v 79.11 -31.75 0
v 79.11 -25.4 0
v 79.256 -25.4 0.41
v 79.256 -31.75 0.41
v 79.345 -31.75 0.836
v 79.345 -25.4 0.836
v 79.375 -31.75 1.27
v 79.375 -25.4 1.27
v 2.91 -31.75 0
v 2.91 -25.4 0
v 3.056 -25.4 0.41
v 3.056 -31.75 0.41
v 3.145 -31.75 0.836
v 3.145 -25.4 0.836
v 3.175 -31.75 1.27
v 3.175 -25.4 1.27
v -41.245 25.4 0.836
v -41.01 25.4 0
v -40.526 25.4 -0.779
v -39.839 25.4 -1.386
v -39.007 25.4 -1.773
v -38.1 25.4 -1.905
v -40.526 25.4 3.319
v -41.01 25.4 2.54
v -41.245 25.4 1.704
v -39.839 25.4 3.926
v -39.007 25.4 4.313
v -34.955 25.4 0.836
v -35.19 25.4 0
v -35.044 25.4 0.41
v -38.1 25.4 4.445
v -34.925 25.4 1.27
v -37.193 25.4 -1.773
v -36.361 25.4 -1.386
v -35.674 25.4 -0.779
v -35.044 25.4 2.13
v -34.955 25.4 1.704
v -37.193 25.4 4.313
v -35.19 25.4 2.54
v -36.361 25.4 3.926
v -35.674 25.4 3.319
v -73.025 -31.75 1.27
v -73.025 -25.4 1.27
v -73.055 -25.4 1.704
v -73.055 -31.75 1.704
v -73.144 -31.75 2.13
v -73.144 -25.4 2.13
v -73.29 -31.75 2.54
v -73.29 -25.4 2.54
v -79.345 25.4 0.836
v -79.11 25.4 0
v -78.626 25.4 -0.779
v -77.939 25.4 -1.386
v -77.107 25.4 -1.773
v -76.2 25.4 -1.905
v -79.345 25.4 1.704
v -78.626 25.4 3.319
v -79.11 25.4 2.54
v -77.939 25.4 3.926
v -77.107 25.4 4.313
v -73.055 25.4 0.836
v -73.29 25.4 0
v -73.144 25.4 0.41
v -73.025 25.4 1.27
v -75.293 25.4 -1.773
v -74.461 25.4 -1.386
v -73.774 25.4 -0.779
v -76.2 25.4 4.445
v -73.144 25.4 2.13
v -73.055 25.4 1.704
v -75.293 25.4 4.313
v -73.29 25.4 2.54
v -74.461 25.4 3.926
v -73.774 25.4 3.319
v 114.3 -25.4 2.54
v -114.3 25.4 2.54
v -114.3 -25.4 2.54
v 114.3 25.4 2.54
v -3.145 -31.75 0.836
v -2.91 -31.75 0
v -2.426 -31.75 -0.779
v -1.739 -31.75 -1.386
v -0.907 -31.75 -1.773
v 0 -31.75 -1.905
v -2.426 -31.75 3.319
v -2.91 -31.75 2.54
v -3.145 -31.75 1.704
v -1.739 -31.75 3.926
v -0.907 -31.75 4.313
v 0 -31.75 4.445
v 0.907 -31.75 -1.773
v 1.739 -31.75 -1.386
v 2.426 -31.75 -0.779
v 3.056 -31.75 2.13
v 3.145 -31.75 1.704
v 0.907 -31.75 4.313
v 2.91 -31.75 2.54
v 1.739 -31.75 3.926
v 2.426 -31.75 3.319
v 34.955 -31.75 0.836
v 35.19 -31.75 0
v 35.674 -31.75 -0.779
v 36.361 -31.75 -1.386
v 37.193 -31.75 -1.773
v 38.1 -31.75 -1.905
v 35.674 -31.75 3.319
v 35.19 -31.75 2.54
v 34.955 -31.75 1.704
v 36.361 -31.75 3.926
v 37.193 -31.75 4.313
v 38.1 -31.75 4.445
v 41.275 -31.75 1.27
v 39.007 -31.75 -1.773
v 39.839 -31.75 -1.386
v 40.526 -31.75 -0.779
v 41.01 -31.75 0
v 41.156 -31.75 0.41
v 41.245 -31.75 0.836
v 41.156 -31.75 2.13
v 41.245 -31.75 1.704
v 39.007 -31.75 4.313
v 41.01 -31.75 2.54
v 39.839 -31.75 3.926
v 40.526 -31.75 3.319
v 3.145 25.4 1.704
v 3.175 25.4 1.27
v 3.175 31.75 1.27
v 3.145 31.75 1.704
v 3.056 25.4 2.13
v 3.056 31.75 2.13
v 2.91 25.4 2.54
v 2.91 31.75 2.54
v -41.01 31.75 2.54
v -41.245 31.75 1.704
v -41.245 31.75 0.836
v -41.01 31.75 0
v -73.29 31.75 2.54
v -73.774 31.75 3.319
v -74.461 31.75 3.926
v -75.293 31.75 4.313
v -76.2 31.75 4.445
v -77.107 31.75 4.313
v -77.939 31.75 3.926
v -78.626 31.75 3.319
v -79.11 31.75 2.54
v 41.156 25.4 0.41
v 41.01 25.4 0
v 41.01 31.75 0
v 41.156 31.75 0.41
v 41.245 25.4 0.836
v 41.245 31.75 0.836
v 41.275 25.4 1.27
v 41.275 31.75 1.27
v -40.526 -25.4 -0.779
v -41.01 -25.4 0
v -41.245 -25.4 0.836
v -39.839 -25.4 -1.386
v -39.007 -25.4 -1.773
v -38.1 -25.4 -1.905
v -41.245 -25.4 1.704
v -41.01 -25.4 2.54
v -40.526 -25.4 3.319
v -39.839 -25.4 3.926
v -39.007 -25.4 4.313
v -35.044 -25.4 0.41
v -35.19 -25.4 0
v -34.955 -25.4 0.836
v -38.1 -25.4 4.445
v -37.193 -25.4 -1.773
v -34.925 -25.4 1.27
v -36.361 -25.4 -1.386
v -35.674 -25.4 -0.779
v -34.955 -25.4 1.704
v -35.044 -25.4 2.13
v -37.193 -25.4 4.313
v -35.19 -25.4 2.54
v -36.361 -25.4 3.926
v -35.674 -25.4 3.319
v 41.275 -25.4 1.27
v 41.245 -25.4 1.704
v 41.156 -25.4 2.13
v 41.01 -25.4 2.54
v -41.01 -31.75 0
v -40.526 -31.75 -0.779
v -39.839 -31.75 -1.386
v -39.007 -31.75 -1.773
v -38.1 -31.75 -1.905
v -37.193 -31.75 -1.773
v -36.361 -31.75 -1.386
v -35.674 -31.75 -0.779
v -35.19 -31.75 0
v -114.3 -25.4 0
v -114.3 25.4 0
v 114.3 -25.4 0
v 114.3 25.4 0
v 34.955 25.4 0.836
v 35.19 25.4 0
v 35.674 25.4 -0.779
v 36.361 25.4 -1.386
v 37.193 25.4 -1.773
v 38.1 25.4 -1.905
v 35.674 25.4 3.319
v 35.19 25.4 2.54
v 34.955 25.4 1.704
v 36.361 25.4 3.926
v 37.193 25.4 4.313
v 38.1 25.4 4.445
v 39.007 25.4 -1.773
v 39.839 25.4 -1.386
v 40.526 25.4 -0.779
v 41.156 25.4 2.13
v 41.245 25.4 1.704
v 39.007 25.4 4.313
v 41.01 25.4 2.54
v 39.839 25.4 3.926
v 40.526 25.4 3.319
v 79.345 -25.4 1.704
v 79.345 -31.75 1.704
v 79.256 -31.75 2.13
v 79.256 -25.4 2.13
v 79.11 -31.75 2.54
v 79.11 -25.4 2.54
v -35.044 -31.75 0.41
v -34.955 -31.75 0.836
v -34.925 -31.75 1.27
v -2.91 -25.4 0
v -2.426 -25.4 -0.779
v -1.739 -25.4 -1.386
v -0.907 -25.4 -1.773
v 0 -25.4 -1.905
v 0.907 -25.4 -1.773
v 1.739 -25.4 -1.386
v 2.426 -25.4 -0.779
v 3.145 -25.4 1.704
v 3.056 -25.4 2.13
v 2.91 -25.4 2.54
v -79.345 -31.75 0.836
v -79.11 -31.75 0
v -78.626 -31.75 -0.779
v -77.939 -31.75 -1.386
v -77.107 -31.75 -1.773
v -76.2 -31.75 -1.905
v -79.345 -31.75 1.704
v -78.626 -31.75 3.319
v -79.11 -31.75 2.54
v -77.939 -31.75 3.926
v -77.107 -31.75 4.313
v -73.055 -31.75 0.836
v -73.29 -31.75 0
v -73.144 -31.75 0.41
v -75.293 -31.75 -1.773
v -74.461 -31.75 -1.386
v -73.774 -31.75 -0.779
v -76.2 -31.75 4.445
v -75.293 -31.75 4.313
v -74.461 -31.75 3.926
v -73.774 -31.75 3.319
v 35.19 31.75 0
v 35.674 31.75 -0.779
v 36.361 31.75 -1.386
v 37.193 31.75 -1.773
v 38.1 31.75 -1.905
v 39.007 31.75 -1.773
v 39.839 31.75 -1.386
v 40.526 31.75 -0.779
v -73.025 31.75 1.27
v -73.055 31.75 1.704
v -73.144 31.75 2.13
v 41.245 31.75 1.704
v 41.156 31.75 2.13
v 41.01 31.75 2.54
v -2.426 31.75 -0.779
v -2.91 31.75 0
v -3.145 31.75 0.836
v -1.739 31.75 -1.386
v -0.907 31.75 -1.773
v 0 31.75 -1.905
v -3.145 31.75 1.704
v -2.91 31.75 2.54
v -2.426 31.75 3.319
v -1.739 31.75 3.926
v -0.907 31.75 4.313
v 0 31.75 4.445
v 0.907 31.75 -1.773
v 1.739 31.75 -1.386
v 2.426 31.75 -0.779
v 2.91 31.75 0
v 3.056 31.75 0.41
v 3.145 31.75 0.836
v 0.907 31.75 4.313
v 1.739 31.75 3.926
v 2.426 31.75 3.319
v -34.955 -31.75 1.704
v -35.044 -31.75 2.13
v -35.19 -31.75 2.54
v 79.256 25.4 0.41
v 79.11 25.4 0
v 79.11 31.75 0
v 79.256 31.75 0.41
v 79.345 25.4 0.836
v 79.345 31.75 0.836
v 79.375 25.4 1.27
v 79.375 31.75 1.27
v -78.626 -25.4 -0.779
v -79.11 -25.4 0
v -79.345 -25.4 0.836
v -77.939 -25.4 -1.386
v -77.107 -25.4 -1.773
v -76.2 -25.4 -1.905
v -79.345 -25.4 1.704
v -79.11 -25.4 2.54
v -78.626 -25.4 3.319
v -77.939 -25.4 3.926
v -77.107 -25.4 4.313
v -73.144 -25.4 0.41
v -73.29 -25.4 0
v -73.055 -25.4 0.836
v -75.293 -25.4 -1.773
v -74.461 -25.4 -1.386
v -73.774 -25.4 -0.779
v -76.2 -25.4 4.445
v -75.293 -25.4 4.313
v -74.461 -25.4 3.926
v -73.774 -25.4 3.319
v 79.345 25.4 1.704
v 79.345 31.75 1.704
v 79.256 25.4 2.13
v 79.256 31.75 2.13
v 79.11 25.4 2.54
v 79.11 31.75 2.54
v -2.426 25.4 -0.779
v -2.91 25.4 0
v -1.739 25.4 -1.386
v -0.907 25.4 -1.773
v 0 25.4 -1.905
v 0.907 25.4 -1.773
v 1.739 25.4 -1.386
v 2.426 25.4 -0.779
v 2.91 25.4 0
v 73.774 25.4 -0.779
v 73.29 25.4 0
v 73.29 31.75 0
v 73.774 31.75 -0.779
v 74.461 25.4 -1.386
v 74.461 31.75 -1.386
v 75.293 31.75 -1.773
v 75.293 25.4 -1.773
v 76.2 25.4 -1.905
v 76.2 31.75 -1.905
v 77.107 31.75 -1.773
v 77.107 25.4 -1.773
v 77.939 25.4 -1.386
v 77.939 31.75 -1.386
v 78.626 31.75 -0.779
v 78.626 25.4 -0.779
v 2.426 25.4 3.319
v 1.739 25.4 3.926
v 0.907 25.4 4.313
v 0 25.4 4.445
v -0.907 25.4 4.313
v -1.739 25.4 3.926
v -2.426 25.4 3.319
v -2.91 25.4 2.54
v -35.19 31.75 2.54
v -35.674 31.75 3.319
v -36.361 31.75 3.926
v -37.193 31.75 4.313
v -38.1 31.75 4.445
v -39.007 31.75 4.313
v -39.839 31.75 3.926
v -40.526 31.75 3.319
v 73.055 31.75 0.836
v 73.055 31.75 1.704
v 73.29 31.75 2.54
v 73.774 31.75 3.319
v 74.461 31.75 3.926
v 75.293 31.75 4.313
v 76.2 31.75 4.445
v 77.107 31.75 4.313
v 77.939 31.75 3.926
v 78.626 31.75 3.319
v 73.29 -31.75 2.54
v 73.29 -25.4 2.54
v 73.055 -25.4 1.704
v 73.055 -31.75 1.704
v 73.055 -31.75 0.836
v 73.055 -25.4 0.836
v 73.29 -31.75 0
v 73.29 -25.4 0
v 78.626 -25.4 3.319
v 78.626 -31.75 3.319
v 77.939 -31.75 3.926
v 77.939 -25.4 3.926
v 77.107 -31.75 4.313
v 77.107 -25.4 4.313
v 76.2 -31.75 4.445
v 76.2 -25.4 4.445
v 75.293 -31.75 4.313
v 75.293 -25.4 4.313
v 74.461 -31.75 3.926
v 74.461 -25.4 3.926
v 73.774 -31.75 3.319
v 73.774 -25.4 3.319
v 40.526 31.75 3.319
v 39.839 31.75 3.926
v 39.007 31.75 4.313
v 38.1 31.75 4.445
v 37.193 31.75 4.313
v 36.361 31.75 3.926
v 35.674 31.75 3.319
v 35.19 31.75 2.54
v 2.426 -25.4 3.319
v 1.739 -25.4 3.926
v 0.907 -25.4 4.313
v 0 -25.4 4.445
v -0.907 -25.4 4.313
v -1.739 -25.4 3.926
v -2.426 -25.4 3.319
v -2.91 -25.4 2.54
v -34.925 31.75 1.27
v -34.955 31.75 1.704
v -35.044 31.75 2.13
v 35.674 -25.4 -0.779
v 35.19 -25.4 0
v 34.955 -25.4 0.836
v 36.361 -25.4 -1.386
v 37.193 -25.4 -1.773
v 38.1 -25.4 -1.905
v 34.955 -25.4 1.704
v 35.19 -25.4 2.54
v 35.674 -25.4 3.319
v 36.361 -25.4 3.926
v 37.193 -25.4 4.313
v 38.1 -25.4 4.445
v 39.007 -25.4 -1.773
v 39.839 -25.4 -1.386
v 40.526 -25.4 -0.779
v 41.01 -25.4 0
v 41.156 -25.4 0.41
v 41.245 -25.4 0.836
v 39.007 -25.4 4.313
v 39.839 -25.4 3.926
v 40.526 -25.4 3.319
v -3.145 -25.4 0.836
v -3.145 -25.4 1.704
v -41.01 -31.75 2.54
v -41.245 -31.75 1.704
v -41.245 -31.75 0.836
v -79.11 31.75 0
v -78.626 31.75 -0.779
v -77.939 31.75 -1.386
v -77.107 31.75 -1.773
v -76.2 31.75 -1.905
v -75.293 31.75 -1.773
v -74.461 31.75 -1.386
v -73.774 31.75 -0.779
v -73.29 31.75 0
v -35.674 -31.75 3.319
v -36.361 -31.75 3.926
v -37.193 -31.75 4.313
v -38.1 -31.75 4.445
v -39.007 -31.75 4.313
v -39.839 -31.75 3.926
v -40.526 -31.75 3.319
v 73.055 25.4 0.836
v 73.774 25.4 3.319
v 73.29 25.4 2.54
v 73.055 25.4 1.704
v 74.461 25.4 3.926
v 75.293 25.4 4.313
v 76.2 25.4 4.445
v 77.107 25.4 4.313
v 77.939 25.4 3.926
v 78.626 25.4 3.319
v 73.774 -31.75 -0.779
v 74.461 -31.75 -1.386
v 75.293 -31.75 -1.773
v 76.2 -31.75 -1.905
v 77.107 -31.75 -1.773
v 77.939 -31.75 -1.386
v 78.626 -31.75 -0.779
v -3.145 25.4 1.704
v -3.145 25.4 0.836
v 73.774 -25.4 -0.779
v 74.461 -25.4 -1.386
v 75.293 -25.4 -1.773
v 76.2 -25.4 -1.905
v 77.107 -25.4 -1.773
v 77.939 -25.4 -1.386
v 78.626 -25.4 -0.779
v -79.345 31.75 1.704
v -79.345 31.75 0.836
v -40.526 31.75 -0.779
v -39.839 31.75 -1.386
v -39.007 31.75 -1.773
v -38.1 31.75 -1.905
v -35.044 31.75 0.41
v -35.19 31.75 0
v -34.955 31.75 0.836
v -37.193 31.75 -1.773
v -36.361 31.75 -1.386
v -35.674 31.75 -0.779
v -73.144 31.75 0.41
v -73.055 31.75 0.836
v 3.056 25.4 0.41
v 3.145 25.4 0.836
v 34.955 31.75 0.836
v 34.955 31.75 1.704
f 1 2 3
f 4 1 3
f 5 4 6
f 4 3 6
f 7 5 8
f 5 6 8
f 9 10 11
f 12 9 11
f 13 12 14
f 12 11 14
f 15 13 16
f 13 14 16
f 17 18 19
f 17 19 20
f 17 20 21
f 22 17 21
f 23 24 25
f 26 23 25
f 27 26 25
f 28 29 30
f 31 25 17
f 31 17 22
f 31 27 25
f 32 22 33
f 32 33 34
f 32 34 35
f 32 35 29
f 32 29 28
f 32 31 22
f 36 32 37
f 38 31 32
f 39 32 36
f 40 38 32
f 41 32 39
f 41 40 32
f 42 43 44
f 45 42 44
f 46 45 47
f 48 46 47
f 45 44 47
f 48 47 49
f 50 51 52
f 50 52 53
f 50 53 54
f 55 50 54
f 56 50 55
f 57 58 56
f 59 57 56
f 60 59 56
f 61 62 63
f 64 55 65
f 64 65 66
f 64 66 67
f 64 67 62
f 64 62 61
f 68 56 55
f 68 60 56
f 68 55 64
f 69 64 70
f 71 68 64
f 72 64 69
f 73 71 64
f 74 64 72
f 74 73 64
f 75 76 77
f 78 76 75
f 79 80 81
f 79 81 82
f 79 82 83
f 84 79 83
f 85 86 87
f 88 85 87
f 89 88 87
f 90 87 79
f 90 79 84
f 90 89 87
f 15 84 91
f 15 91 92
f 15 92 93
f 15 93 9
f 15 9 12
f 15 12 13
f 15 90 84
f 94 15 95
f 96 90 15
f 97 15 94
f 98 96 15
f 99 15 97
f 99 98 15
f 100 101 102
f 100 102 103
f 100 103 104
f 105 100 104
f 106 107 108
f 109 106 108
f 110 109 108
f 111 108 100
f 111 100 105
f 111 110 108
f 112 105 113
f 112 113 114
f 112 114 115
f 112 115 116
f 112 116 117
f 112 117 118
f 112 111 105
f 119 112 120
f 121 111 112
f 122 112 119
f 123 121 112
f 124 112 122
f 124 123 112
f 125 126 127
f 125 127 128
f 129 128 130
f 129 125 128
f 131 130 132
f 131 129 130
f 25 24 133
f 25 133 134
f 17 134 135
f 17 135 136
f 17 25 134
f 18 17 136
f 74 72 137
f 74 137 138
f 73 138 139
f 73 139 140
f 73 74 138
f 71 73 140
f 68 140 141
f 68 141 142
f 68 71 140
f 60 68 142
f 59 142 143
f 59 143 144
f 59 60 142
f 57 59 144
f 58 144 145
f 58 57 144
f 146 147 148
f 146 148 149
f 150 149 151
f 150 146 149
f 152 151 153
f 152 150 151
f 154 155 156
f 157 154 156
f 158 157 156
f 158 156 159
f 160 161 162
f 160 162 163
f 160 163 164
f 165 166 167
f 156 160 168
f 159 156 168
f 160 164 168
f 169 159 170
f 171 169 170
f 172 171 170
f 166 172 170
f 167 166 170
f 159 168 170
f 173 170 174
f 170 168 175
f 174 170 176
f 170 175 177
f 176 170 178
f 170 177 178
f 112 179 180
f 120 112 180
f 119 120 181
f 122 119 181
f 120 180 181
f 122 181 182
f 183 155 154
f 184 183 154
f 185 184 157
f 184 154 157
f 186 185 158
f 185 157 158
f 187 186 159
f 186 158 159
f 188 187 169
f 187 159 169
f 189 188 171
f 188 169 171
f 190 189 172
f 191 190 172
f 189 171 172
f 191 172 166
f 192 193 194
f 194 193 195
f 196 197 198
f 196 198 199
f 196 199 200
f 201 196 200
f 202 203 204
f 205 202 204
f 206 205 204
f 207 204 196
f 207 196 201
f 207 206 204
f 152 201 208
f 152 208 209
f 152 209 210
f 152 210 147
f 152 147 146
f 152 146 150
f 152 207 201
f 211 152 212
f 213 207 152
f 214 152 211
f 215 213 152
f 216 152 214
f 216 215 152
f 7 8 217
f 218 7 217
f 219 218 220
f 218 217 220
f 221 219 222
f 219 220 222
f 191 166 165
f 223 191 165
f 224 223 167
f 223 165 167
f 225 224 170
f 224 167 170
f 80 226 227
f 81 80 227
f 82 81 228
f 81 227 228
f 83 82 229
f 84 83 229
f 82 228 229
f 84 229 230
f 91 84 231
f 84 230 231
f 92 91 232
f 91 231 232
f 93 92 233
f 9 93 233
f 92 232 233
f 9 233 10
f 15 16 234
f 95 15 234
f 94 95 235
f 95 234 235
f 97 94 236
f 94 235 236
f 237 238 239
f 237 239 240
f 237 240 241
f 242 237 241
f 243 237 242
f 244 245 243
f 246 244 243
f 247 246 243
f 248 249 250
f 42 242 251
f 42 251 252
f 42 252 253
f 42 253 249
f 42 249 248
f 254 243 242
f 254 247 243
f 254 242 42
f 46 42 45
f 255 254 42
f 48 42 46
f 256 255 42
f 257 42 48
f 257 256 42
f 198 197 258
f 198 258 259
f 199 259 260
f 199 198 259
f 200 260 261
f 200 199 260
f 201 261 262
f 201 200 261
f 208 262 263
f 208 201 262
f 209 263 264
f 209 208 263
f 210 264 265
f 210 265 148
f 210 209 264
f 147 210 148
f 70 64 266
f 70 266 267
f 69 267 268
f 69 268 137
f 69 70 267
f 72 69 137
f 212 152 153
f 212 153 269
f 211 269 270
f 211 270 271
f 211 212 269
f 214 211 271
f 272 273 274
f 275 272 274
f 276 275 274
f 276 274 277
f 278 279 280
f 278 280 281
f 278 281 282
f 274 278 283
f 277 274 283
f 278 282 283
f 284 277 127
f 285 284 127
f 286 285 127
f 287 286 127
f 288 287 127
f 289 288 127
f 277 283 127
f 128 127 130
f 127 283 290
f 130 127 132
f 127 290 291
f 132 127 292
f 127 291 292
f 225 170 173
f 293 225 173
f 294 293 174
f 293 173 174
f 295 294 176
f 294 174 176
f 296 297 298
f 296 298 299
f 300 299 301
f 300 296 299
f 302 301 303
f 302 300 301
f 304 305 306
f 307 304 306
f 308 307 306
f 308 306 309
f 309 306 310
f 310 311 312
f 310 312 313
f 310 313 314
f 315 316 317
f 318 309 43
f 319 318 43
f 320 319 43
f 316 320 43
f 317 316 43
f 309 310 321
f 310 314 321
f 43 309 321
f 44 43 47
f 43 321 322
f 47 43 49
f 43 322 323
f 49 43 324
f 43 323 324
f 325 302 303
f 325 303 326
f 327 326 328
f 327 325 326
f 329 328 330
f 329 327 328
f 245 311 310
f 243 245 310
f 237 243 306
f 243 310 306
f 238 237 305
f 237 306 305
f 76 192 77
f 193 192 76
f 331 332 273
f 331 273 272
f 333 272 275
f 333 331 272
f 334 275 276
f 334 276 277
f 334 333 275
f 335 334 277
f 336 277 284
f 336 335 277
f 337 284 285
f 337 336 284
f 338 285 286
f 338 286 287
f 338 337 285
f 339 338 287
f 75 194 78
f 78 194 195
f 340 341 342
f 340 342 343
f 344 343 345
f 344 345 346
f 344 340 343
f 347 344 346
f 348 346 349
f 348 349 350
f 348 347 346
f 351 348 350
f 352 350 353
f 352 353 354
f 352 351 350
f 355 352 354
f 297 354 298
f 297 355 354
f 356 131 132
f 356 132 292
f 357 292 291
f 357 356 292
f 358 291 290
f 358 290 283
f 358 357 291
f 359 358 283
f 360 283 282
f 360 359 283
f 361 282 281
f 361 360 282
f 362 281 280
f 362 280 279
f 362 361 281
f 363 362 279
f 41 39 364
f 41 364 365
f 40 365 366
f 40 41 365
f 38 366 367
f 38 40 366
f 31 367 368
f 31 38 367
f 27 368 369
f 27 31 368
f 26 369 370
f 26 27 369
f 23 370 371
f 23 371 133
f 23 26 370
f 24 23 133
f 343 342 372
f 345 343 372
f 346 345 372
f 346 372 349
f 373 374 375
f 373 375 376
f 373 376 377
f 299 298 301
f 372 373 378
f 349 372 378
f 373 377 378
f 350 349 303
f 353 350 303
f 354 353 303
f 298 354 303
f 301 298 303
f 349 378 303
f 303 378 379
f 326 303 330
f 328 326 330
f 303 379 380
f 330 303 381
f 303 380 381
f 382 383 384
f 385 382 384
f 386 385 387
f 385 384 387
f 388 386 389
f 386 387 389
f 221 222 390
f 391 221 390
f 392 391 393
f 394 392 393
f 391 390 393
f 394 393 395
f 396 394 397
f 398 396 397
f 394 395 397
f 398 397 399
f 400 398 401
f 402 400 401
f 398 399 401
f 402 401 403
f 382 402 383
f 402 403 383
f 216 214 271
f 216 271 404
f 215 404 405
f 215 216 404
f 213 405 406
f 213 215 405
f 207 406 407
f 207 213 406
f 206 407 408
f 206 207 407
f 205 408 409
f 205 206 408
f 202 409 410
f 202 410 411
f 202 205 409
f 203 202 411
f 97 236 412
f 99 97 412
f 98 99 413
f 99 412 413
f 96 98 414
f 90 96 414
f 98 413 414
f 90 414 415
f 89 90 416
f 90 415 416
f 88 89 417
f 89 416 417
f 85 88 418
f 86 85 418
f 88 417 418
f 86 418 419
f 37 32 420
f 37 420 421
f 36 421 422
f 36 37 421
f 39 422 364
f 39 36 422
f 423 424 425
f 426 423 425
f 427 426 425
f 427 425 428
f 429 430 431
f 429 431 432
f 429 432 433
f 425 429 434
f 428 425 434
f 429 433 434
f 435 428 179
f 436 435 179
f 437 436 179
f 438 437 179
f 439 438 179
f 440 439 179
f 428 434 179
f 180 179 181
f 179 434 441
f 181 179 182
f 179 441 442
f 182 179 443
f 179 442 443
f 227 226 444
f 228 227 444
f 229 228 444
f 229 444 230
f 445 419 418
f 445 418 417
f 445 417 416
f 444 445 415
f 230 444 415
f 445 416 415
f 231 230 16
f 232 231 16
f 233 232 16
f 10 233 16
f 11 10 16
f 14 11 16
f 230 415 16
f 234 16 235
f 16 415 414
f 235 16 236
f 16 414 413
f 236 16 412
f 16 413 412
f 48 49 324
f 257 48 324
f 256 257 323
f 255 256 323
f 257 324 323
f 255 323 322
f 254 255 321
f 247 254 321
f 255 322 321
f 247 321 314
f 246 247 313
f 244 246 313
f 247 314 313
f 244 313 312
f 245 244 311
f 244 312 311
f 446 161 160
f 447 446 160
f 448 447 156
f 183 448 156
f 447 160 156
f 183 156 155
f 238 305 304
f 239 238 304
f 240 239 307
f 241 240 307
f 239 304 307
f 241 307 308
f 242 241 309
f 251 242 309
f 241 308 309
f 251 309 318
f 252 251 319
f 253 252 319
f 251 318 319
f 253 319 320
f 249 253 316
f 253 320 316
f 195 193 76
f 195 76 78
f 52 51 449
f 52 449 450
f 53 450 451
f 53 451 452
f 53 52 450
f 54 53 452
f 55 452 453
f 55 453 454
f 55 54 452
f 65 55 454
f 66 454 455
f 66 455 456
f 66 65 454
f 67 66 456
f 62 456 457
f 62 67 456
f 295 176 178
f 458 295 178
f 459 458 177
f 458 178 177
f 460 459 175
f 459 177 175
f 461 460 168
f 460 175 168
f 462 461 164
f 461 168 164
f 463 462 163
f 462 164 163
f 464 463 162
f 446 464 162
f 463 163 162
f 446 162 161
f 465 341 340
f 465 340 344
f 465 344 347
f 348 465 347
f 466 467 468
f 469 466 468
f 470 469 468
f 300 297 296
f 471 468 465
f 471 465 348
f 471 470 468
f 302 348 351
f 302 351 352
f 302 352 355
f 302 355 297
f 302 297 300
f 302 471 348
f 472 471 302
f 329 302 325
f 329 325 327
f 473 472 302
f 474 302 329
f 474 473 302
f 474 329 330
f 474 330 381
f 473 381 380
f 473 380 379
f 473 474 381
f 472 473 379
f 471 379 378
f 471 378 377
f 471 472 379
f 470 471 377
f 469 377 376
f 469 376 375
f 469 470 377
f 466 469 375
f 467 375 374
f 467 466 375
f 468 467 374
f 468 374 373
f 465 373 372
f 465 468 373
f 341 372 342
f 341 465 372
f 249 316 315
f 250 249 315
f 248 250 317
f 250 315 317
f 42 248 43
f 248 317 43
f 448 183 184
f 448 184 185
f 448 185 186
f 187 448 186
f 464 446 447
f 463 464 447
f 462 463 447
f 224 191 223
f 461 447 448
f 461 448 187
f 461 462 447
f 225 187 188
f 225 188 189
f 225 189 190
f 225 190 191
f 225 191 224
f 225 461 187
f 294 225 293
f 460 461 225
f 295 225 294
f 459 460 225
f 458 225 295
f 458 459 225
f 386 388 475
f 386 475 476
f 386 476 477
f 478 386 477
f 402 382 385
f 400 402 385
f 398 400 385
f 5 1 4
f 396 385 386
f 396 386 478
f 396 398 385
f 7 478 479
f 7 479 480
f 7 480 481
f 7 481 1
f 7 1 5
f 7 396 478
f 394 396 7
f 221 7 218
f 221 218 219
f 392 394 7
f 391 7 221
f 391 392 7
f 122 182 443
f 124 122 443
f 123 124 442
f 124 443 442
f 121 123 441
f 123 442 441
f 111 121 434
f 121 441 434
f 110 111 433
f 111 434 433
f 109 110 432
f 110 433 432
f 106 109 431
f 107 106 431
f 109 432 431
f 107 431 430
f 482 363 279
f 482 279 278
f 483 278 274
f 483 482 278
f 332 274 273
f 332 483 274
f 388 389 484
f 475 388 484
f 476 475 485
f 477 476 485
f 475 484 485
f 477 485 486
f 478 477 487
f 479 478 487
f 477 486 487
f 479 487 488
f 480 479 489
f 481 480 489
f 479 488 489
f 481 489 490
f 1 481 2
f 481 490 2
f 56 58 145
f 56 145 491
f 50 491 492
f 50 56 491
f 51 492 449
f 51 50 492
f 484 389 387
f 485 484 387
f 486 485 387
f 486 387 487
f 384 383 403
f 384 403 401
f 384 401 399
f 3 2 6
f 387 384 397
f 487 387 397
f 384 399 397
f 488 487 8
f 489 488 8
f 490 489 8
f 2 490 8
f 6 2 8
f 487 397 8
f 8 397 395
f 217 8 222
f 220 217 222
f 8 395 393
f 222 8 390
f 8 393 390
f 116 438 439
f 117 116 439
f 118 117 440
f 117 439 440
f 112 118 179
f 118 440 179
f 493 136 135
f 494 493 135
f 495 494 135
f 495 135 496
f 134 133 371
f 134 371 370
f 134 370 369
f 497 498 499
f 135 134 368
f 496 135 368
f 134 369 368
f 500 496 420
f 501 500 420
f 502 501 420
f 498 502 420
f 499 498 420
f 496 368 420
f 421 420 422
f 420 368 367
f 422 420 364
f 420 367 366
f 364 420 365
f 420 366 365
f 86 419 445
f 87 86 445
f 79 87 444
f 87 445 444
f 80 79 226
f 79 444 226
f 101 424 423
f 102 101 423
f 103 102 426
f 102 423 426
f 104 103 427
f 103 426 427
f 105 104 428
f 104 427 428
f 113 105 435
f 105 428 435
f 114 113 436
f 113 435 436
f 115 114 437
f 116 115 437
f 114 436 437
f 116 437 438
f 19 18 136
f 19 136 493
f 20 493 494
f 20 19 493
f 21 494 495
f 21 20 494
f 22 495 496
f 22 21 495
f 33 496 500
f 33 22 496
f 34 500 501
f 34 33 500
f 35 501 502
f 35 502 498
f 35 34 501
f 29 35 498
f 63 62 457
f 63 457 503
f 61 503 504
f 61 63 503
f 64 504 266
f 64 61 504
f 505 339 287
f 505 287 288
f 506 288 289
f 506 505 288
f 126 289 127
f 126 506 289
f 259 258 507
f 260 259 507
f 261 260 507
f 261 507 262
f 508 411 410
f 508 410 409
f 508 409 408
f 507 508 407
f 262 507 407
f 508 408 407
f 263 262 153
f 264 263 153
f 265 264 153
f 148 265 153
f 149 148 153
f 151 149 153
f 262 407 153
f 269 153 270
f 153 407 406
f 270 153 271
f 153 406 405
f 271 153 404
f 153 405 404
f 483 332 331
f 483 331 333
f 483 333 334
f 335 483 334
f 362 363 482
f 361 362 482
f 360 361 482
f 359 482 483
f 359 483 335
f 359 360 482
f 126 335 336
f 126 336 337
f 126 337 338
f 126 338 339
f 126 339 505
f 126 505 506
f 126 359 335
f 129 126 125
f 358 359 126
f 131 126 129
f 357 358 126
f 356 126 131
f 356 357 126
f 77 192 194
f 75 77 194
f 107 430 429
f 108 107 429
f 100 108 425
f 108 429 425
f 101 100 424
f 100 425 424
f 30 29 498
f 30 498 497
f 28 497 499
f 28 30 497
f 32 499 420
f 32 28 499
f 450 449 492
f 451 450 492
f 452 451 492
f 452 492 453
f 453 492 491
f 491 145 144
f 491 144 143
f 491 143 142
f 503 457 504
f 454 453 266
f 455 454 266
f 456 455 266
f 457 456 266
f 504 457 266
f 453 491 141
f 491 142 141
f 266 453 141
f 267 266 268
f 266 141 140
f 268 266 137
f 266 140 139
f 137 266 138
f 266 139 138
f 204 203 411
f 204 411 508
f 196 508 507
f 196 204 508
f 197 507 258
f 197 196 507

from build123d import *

# Parameters (mm, degrees)
F0_W     = 228.6
F0_H     = 50.8
F1_DEPTH = 2.54
F3_DEPTH = 6.35


with BuildPart() as f1:
    # F0 (on Top) → F1 (new body)
    with BuildSketch(Plane.XY):
        Rectangle(F0_W, F0_H)
    extrude(amount=F1_DEPTH)


with BuildPart() as f3:
    # F2 (on face) → F3 (new body)
    with BuildSketch(Plane.XZ.offset(25.4)):
        with BuildLine():
            ThreePointArc((-79.1099355663, 0), (-76.2, -1.905), (-73.2900644337, 0))
            Line((-73.2900644337, 0), (-79.1099355663, 0))
        make_face()
        with BuildLine():
            ThreePointArc((-73.2900644337, 0), (-73.0919724564, 0.6213168813), (-73.025, 1.27))
            ThreePointArc((-73.025, 1.27), (-73.0919724564, 1.9186831187), (-73.2900644337, 2.54))
            Line((-73.2900644337, 2.54), (-79.1099355663, 2.54))
            ThreePointArc((-79.1099355663, 2.54), (-79.375, 1.27), (-79.1099355663, 0))
            Line((-79.1099355663, 0), (-73.2900644337, 0))
        make_face()
        with BuildLine():
            Line((-79.1099355663, 2.54), (-73.2900644337, 2.54))
            ThreePointArc((-73.2900644337, 2.54), (-76.2, 4.445), (-79.1099355663, 2.54))
        make_face()
    extrude(amount=F3_DEPTH)


with BuildPart() as f3b:
    # F2 (on face) → F3, piece 2 (new body)
    with BuildSketch(Plane.XZ.offset(25.4)):
        with BuildLine():
            Line((-35.1900644337, 0), (-41.0099355663, 0))
            ThreePointArc((-41.0099355663, 0), (-38.1, -1.905), (-35.1900644337, 0))
        make_face()
        with BuildLine():
            Line((-35.1900644337, 2.54), (-41.0099355663, 2.54))
            ThreePointArc((-41.0099355663, 2.54), (-41.275, 1.27), (-41.0099355663, 0))
            Line((-41.0099355663, 0), (-35.1900644337, 0))
            ThreePointArc((-35.1900644337, 0), (-34.9919724564, 0.6213168813), (-34.925, 1.27))
            ThreePointArc((-34.925, 1.27), (-34.9919724564, 1.9186831187), (-35.1900644337, 2.54))
        make_face()
        with BuildLine():
            ThreePointArc((-35.1900644337, 2.54), (-38.1, 4.445), (-41.0099355663, 2.54))
            Line((-41.0099355663, 2.54), (-35.1900644337, 2.54))
        make_face()
    extrude(amount=F3_DEPTH)


with BuildPart() as f3c:
    # F2 (on face) → F3, piece 3 (new body)
    with BuildSketch(Plane.XZ.offset(25.4)):
        with BuildLine():
            Line((2.9099355663, 0), (-2.9099355663, 0))
            ThreePointArc((-2.9099355663, 0), (0, -1.905), (2.9099355663, 0))
        make_face()
        with BuildLine():
            Line((2.9099355663, 2.54), (-2.9099355663, 2.54))
            ThreePointArc((-2.9099355663, 2.54), (-3.175, 1.27), (-2.9099355663, 0))
            Line((-2.9099355663, 0), (2.9099355663, 0))
            ThreePointArc((2.9099355663, 0), (3.1080275436, 0.6213168813), (3.175, 1.27))
            ThreePointArc((3.175, 1.27), (3.1080275436, 1.9186831187), (2.9099355663, 2.54))
        make_face()
        with BuildLine():
            ThreePointArc((2.9099355663, 2.54), (0, 4.445), (-2.9099355663, 2.54))
            Line((-2.9099355663, 2.54), (2.9099355663, 2.54))
        make_face()
    extrude(amount=F3_DEPTH)


with BuildPart() as f3d:
    # F2 (on face) → F3, piece 4 (new body)
    with BuildSketch(Plane.XZ.offset(25.4)):
        with BuildLine():
            ThreePointArc((41.0099355663, 2.54), (38.1, 4.445), (35.1900644337, 2.54))
            Line((35.1900644337, 2.54), (41.0099355663, 2.54))
        make_face()
        with BuildLine():
            Line((41.0099355663, 2.54), (35.1900644337, 2.54))
            ThreePointArc((35.1900644337, 2.54), (34.925, 1.27), (35.1900644337, 0))
            Line((35.1900644337, 0), (41.0099355663, 0))
            ThreePointArc((41.0099355663, 0), (41.2080275436, 0.6213168813), (41.275, 1.27))
            ThreePointArc((41.275, 1.27), (41.2080275436, 1.9186831187), (41.0099355663, 2.54))
        make_face()
        with BuildLine():
            Line((41.0099355663, 0), (35.1900644337, 0))
            ThreePointArc((35.1900644337, 0), (38.1, -1.905), (41.0099355663, 0))
        make_face()
    extrude(amount=F3_DEPTH)


with BuildPart() as f3e:
    # F2 (on face) → F3, piece 5 (new body)
    with BuildSketch(Plane.XZ.offset(25.4)):
        with BuildLine():
            Line((79.1099355663, 0), (73.2900644337, 0))
            ThreePointArc((73.2900644337, 0), (76.2, -1.905), (79.1099355663, 0))
        make_face()
        with BuildLine():
            Line((79.1099355663, 2.54), (73.2900644337, 2.54))
            ThreePointArc((73.2900644337, 2.54), (73.025, 1.27), (73.2900644337, 0))
            Line((73.2900644337, 0), (79.1099355663, 0))
            ThreePointArc((79.1099355663, 0), (79.3080275436, 0.6213168813), (79.375, 1.27))
            ThreePointArc((79.375, 1.27), (79.3080275436, 1.9186831187), (79.1099355663, 2.54))
        make_face()
        with BuildLine():
            ThreePointArc((79.1099355663, 2.54), (76.2, 4.445), (73.2900644337, 2.54))
            Line((73.2900644337, 2.54), (79.1099355663, 2.54))
        make_face()
    extrude(amount=F3_DEPTH)


with BuildPart() as f4_1:
    # F4: instance of F3
    add(f3.part.mirror(Plane.XZ))


with BuildPart() as f4_2:
    # F4: instance of F3b
    add(f3b.part.mirror(Plane.XZ))


with BuildPart() as f4_3:
    # F4: instance of F3c
    add(f3c.part.mirror(Plane.XZ))


with BuildPart() as f4_4:
    # F4: instance of F3d
    add(f3d.part.mirror(Plane.XZ))


with BuildPart() as f4_5:
    # F4: instance of F3e
    add(f3e.part.mirror(Plane.XZ))


solid = Compound([f1.part, f3.part, f3b.part, f3c.part, f3d.part, f3e.part, f4_1.part, f4_2.part, f4_3.part, f4_4.part, f4_5.part])
